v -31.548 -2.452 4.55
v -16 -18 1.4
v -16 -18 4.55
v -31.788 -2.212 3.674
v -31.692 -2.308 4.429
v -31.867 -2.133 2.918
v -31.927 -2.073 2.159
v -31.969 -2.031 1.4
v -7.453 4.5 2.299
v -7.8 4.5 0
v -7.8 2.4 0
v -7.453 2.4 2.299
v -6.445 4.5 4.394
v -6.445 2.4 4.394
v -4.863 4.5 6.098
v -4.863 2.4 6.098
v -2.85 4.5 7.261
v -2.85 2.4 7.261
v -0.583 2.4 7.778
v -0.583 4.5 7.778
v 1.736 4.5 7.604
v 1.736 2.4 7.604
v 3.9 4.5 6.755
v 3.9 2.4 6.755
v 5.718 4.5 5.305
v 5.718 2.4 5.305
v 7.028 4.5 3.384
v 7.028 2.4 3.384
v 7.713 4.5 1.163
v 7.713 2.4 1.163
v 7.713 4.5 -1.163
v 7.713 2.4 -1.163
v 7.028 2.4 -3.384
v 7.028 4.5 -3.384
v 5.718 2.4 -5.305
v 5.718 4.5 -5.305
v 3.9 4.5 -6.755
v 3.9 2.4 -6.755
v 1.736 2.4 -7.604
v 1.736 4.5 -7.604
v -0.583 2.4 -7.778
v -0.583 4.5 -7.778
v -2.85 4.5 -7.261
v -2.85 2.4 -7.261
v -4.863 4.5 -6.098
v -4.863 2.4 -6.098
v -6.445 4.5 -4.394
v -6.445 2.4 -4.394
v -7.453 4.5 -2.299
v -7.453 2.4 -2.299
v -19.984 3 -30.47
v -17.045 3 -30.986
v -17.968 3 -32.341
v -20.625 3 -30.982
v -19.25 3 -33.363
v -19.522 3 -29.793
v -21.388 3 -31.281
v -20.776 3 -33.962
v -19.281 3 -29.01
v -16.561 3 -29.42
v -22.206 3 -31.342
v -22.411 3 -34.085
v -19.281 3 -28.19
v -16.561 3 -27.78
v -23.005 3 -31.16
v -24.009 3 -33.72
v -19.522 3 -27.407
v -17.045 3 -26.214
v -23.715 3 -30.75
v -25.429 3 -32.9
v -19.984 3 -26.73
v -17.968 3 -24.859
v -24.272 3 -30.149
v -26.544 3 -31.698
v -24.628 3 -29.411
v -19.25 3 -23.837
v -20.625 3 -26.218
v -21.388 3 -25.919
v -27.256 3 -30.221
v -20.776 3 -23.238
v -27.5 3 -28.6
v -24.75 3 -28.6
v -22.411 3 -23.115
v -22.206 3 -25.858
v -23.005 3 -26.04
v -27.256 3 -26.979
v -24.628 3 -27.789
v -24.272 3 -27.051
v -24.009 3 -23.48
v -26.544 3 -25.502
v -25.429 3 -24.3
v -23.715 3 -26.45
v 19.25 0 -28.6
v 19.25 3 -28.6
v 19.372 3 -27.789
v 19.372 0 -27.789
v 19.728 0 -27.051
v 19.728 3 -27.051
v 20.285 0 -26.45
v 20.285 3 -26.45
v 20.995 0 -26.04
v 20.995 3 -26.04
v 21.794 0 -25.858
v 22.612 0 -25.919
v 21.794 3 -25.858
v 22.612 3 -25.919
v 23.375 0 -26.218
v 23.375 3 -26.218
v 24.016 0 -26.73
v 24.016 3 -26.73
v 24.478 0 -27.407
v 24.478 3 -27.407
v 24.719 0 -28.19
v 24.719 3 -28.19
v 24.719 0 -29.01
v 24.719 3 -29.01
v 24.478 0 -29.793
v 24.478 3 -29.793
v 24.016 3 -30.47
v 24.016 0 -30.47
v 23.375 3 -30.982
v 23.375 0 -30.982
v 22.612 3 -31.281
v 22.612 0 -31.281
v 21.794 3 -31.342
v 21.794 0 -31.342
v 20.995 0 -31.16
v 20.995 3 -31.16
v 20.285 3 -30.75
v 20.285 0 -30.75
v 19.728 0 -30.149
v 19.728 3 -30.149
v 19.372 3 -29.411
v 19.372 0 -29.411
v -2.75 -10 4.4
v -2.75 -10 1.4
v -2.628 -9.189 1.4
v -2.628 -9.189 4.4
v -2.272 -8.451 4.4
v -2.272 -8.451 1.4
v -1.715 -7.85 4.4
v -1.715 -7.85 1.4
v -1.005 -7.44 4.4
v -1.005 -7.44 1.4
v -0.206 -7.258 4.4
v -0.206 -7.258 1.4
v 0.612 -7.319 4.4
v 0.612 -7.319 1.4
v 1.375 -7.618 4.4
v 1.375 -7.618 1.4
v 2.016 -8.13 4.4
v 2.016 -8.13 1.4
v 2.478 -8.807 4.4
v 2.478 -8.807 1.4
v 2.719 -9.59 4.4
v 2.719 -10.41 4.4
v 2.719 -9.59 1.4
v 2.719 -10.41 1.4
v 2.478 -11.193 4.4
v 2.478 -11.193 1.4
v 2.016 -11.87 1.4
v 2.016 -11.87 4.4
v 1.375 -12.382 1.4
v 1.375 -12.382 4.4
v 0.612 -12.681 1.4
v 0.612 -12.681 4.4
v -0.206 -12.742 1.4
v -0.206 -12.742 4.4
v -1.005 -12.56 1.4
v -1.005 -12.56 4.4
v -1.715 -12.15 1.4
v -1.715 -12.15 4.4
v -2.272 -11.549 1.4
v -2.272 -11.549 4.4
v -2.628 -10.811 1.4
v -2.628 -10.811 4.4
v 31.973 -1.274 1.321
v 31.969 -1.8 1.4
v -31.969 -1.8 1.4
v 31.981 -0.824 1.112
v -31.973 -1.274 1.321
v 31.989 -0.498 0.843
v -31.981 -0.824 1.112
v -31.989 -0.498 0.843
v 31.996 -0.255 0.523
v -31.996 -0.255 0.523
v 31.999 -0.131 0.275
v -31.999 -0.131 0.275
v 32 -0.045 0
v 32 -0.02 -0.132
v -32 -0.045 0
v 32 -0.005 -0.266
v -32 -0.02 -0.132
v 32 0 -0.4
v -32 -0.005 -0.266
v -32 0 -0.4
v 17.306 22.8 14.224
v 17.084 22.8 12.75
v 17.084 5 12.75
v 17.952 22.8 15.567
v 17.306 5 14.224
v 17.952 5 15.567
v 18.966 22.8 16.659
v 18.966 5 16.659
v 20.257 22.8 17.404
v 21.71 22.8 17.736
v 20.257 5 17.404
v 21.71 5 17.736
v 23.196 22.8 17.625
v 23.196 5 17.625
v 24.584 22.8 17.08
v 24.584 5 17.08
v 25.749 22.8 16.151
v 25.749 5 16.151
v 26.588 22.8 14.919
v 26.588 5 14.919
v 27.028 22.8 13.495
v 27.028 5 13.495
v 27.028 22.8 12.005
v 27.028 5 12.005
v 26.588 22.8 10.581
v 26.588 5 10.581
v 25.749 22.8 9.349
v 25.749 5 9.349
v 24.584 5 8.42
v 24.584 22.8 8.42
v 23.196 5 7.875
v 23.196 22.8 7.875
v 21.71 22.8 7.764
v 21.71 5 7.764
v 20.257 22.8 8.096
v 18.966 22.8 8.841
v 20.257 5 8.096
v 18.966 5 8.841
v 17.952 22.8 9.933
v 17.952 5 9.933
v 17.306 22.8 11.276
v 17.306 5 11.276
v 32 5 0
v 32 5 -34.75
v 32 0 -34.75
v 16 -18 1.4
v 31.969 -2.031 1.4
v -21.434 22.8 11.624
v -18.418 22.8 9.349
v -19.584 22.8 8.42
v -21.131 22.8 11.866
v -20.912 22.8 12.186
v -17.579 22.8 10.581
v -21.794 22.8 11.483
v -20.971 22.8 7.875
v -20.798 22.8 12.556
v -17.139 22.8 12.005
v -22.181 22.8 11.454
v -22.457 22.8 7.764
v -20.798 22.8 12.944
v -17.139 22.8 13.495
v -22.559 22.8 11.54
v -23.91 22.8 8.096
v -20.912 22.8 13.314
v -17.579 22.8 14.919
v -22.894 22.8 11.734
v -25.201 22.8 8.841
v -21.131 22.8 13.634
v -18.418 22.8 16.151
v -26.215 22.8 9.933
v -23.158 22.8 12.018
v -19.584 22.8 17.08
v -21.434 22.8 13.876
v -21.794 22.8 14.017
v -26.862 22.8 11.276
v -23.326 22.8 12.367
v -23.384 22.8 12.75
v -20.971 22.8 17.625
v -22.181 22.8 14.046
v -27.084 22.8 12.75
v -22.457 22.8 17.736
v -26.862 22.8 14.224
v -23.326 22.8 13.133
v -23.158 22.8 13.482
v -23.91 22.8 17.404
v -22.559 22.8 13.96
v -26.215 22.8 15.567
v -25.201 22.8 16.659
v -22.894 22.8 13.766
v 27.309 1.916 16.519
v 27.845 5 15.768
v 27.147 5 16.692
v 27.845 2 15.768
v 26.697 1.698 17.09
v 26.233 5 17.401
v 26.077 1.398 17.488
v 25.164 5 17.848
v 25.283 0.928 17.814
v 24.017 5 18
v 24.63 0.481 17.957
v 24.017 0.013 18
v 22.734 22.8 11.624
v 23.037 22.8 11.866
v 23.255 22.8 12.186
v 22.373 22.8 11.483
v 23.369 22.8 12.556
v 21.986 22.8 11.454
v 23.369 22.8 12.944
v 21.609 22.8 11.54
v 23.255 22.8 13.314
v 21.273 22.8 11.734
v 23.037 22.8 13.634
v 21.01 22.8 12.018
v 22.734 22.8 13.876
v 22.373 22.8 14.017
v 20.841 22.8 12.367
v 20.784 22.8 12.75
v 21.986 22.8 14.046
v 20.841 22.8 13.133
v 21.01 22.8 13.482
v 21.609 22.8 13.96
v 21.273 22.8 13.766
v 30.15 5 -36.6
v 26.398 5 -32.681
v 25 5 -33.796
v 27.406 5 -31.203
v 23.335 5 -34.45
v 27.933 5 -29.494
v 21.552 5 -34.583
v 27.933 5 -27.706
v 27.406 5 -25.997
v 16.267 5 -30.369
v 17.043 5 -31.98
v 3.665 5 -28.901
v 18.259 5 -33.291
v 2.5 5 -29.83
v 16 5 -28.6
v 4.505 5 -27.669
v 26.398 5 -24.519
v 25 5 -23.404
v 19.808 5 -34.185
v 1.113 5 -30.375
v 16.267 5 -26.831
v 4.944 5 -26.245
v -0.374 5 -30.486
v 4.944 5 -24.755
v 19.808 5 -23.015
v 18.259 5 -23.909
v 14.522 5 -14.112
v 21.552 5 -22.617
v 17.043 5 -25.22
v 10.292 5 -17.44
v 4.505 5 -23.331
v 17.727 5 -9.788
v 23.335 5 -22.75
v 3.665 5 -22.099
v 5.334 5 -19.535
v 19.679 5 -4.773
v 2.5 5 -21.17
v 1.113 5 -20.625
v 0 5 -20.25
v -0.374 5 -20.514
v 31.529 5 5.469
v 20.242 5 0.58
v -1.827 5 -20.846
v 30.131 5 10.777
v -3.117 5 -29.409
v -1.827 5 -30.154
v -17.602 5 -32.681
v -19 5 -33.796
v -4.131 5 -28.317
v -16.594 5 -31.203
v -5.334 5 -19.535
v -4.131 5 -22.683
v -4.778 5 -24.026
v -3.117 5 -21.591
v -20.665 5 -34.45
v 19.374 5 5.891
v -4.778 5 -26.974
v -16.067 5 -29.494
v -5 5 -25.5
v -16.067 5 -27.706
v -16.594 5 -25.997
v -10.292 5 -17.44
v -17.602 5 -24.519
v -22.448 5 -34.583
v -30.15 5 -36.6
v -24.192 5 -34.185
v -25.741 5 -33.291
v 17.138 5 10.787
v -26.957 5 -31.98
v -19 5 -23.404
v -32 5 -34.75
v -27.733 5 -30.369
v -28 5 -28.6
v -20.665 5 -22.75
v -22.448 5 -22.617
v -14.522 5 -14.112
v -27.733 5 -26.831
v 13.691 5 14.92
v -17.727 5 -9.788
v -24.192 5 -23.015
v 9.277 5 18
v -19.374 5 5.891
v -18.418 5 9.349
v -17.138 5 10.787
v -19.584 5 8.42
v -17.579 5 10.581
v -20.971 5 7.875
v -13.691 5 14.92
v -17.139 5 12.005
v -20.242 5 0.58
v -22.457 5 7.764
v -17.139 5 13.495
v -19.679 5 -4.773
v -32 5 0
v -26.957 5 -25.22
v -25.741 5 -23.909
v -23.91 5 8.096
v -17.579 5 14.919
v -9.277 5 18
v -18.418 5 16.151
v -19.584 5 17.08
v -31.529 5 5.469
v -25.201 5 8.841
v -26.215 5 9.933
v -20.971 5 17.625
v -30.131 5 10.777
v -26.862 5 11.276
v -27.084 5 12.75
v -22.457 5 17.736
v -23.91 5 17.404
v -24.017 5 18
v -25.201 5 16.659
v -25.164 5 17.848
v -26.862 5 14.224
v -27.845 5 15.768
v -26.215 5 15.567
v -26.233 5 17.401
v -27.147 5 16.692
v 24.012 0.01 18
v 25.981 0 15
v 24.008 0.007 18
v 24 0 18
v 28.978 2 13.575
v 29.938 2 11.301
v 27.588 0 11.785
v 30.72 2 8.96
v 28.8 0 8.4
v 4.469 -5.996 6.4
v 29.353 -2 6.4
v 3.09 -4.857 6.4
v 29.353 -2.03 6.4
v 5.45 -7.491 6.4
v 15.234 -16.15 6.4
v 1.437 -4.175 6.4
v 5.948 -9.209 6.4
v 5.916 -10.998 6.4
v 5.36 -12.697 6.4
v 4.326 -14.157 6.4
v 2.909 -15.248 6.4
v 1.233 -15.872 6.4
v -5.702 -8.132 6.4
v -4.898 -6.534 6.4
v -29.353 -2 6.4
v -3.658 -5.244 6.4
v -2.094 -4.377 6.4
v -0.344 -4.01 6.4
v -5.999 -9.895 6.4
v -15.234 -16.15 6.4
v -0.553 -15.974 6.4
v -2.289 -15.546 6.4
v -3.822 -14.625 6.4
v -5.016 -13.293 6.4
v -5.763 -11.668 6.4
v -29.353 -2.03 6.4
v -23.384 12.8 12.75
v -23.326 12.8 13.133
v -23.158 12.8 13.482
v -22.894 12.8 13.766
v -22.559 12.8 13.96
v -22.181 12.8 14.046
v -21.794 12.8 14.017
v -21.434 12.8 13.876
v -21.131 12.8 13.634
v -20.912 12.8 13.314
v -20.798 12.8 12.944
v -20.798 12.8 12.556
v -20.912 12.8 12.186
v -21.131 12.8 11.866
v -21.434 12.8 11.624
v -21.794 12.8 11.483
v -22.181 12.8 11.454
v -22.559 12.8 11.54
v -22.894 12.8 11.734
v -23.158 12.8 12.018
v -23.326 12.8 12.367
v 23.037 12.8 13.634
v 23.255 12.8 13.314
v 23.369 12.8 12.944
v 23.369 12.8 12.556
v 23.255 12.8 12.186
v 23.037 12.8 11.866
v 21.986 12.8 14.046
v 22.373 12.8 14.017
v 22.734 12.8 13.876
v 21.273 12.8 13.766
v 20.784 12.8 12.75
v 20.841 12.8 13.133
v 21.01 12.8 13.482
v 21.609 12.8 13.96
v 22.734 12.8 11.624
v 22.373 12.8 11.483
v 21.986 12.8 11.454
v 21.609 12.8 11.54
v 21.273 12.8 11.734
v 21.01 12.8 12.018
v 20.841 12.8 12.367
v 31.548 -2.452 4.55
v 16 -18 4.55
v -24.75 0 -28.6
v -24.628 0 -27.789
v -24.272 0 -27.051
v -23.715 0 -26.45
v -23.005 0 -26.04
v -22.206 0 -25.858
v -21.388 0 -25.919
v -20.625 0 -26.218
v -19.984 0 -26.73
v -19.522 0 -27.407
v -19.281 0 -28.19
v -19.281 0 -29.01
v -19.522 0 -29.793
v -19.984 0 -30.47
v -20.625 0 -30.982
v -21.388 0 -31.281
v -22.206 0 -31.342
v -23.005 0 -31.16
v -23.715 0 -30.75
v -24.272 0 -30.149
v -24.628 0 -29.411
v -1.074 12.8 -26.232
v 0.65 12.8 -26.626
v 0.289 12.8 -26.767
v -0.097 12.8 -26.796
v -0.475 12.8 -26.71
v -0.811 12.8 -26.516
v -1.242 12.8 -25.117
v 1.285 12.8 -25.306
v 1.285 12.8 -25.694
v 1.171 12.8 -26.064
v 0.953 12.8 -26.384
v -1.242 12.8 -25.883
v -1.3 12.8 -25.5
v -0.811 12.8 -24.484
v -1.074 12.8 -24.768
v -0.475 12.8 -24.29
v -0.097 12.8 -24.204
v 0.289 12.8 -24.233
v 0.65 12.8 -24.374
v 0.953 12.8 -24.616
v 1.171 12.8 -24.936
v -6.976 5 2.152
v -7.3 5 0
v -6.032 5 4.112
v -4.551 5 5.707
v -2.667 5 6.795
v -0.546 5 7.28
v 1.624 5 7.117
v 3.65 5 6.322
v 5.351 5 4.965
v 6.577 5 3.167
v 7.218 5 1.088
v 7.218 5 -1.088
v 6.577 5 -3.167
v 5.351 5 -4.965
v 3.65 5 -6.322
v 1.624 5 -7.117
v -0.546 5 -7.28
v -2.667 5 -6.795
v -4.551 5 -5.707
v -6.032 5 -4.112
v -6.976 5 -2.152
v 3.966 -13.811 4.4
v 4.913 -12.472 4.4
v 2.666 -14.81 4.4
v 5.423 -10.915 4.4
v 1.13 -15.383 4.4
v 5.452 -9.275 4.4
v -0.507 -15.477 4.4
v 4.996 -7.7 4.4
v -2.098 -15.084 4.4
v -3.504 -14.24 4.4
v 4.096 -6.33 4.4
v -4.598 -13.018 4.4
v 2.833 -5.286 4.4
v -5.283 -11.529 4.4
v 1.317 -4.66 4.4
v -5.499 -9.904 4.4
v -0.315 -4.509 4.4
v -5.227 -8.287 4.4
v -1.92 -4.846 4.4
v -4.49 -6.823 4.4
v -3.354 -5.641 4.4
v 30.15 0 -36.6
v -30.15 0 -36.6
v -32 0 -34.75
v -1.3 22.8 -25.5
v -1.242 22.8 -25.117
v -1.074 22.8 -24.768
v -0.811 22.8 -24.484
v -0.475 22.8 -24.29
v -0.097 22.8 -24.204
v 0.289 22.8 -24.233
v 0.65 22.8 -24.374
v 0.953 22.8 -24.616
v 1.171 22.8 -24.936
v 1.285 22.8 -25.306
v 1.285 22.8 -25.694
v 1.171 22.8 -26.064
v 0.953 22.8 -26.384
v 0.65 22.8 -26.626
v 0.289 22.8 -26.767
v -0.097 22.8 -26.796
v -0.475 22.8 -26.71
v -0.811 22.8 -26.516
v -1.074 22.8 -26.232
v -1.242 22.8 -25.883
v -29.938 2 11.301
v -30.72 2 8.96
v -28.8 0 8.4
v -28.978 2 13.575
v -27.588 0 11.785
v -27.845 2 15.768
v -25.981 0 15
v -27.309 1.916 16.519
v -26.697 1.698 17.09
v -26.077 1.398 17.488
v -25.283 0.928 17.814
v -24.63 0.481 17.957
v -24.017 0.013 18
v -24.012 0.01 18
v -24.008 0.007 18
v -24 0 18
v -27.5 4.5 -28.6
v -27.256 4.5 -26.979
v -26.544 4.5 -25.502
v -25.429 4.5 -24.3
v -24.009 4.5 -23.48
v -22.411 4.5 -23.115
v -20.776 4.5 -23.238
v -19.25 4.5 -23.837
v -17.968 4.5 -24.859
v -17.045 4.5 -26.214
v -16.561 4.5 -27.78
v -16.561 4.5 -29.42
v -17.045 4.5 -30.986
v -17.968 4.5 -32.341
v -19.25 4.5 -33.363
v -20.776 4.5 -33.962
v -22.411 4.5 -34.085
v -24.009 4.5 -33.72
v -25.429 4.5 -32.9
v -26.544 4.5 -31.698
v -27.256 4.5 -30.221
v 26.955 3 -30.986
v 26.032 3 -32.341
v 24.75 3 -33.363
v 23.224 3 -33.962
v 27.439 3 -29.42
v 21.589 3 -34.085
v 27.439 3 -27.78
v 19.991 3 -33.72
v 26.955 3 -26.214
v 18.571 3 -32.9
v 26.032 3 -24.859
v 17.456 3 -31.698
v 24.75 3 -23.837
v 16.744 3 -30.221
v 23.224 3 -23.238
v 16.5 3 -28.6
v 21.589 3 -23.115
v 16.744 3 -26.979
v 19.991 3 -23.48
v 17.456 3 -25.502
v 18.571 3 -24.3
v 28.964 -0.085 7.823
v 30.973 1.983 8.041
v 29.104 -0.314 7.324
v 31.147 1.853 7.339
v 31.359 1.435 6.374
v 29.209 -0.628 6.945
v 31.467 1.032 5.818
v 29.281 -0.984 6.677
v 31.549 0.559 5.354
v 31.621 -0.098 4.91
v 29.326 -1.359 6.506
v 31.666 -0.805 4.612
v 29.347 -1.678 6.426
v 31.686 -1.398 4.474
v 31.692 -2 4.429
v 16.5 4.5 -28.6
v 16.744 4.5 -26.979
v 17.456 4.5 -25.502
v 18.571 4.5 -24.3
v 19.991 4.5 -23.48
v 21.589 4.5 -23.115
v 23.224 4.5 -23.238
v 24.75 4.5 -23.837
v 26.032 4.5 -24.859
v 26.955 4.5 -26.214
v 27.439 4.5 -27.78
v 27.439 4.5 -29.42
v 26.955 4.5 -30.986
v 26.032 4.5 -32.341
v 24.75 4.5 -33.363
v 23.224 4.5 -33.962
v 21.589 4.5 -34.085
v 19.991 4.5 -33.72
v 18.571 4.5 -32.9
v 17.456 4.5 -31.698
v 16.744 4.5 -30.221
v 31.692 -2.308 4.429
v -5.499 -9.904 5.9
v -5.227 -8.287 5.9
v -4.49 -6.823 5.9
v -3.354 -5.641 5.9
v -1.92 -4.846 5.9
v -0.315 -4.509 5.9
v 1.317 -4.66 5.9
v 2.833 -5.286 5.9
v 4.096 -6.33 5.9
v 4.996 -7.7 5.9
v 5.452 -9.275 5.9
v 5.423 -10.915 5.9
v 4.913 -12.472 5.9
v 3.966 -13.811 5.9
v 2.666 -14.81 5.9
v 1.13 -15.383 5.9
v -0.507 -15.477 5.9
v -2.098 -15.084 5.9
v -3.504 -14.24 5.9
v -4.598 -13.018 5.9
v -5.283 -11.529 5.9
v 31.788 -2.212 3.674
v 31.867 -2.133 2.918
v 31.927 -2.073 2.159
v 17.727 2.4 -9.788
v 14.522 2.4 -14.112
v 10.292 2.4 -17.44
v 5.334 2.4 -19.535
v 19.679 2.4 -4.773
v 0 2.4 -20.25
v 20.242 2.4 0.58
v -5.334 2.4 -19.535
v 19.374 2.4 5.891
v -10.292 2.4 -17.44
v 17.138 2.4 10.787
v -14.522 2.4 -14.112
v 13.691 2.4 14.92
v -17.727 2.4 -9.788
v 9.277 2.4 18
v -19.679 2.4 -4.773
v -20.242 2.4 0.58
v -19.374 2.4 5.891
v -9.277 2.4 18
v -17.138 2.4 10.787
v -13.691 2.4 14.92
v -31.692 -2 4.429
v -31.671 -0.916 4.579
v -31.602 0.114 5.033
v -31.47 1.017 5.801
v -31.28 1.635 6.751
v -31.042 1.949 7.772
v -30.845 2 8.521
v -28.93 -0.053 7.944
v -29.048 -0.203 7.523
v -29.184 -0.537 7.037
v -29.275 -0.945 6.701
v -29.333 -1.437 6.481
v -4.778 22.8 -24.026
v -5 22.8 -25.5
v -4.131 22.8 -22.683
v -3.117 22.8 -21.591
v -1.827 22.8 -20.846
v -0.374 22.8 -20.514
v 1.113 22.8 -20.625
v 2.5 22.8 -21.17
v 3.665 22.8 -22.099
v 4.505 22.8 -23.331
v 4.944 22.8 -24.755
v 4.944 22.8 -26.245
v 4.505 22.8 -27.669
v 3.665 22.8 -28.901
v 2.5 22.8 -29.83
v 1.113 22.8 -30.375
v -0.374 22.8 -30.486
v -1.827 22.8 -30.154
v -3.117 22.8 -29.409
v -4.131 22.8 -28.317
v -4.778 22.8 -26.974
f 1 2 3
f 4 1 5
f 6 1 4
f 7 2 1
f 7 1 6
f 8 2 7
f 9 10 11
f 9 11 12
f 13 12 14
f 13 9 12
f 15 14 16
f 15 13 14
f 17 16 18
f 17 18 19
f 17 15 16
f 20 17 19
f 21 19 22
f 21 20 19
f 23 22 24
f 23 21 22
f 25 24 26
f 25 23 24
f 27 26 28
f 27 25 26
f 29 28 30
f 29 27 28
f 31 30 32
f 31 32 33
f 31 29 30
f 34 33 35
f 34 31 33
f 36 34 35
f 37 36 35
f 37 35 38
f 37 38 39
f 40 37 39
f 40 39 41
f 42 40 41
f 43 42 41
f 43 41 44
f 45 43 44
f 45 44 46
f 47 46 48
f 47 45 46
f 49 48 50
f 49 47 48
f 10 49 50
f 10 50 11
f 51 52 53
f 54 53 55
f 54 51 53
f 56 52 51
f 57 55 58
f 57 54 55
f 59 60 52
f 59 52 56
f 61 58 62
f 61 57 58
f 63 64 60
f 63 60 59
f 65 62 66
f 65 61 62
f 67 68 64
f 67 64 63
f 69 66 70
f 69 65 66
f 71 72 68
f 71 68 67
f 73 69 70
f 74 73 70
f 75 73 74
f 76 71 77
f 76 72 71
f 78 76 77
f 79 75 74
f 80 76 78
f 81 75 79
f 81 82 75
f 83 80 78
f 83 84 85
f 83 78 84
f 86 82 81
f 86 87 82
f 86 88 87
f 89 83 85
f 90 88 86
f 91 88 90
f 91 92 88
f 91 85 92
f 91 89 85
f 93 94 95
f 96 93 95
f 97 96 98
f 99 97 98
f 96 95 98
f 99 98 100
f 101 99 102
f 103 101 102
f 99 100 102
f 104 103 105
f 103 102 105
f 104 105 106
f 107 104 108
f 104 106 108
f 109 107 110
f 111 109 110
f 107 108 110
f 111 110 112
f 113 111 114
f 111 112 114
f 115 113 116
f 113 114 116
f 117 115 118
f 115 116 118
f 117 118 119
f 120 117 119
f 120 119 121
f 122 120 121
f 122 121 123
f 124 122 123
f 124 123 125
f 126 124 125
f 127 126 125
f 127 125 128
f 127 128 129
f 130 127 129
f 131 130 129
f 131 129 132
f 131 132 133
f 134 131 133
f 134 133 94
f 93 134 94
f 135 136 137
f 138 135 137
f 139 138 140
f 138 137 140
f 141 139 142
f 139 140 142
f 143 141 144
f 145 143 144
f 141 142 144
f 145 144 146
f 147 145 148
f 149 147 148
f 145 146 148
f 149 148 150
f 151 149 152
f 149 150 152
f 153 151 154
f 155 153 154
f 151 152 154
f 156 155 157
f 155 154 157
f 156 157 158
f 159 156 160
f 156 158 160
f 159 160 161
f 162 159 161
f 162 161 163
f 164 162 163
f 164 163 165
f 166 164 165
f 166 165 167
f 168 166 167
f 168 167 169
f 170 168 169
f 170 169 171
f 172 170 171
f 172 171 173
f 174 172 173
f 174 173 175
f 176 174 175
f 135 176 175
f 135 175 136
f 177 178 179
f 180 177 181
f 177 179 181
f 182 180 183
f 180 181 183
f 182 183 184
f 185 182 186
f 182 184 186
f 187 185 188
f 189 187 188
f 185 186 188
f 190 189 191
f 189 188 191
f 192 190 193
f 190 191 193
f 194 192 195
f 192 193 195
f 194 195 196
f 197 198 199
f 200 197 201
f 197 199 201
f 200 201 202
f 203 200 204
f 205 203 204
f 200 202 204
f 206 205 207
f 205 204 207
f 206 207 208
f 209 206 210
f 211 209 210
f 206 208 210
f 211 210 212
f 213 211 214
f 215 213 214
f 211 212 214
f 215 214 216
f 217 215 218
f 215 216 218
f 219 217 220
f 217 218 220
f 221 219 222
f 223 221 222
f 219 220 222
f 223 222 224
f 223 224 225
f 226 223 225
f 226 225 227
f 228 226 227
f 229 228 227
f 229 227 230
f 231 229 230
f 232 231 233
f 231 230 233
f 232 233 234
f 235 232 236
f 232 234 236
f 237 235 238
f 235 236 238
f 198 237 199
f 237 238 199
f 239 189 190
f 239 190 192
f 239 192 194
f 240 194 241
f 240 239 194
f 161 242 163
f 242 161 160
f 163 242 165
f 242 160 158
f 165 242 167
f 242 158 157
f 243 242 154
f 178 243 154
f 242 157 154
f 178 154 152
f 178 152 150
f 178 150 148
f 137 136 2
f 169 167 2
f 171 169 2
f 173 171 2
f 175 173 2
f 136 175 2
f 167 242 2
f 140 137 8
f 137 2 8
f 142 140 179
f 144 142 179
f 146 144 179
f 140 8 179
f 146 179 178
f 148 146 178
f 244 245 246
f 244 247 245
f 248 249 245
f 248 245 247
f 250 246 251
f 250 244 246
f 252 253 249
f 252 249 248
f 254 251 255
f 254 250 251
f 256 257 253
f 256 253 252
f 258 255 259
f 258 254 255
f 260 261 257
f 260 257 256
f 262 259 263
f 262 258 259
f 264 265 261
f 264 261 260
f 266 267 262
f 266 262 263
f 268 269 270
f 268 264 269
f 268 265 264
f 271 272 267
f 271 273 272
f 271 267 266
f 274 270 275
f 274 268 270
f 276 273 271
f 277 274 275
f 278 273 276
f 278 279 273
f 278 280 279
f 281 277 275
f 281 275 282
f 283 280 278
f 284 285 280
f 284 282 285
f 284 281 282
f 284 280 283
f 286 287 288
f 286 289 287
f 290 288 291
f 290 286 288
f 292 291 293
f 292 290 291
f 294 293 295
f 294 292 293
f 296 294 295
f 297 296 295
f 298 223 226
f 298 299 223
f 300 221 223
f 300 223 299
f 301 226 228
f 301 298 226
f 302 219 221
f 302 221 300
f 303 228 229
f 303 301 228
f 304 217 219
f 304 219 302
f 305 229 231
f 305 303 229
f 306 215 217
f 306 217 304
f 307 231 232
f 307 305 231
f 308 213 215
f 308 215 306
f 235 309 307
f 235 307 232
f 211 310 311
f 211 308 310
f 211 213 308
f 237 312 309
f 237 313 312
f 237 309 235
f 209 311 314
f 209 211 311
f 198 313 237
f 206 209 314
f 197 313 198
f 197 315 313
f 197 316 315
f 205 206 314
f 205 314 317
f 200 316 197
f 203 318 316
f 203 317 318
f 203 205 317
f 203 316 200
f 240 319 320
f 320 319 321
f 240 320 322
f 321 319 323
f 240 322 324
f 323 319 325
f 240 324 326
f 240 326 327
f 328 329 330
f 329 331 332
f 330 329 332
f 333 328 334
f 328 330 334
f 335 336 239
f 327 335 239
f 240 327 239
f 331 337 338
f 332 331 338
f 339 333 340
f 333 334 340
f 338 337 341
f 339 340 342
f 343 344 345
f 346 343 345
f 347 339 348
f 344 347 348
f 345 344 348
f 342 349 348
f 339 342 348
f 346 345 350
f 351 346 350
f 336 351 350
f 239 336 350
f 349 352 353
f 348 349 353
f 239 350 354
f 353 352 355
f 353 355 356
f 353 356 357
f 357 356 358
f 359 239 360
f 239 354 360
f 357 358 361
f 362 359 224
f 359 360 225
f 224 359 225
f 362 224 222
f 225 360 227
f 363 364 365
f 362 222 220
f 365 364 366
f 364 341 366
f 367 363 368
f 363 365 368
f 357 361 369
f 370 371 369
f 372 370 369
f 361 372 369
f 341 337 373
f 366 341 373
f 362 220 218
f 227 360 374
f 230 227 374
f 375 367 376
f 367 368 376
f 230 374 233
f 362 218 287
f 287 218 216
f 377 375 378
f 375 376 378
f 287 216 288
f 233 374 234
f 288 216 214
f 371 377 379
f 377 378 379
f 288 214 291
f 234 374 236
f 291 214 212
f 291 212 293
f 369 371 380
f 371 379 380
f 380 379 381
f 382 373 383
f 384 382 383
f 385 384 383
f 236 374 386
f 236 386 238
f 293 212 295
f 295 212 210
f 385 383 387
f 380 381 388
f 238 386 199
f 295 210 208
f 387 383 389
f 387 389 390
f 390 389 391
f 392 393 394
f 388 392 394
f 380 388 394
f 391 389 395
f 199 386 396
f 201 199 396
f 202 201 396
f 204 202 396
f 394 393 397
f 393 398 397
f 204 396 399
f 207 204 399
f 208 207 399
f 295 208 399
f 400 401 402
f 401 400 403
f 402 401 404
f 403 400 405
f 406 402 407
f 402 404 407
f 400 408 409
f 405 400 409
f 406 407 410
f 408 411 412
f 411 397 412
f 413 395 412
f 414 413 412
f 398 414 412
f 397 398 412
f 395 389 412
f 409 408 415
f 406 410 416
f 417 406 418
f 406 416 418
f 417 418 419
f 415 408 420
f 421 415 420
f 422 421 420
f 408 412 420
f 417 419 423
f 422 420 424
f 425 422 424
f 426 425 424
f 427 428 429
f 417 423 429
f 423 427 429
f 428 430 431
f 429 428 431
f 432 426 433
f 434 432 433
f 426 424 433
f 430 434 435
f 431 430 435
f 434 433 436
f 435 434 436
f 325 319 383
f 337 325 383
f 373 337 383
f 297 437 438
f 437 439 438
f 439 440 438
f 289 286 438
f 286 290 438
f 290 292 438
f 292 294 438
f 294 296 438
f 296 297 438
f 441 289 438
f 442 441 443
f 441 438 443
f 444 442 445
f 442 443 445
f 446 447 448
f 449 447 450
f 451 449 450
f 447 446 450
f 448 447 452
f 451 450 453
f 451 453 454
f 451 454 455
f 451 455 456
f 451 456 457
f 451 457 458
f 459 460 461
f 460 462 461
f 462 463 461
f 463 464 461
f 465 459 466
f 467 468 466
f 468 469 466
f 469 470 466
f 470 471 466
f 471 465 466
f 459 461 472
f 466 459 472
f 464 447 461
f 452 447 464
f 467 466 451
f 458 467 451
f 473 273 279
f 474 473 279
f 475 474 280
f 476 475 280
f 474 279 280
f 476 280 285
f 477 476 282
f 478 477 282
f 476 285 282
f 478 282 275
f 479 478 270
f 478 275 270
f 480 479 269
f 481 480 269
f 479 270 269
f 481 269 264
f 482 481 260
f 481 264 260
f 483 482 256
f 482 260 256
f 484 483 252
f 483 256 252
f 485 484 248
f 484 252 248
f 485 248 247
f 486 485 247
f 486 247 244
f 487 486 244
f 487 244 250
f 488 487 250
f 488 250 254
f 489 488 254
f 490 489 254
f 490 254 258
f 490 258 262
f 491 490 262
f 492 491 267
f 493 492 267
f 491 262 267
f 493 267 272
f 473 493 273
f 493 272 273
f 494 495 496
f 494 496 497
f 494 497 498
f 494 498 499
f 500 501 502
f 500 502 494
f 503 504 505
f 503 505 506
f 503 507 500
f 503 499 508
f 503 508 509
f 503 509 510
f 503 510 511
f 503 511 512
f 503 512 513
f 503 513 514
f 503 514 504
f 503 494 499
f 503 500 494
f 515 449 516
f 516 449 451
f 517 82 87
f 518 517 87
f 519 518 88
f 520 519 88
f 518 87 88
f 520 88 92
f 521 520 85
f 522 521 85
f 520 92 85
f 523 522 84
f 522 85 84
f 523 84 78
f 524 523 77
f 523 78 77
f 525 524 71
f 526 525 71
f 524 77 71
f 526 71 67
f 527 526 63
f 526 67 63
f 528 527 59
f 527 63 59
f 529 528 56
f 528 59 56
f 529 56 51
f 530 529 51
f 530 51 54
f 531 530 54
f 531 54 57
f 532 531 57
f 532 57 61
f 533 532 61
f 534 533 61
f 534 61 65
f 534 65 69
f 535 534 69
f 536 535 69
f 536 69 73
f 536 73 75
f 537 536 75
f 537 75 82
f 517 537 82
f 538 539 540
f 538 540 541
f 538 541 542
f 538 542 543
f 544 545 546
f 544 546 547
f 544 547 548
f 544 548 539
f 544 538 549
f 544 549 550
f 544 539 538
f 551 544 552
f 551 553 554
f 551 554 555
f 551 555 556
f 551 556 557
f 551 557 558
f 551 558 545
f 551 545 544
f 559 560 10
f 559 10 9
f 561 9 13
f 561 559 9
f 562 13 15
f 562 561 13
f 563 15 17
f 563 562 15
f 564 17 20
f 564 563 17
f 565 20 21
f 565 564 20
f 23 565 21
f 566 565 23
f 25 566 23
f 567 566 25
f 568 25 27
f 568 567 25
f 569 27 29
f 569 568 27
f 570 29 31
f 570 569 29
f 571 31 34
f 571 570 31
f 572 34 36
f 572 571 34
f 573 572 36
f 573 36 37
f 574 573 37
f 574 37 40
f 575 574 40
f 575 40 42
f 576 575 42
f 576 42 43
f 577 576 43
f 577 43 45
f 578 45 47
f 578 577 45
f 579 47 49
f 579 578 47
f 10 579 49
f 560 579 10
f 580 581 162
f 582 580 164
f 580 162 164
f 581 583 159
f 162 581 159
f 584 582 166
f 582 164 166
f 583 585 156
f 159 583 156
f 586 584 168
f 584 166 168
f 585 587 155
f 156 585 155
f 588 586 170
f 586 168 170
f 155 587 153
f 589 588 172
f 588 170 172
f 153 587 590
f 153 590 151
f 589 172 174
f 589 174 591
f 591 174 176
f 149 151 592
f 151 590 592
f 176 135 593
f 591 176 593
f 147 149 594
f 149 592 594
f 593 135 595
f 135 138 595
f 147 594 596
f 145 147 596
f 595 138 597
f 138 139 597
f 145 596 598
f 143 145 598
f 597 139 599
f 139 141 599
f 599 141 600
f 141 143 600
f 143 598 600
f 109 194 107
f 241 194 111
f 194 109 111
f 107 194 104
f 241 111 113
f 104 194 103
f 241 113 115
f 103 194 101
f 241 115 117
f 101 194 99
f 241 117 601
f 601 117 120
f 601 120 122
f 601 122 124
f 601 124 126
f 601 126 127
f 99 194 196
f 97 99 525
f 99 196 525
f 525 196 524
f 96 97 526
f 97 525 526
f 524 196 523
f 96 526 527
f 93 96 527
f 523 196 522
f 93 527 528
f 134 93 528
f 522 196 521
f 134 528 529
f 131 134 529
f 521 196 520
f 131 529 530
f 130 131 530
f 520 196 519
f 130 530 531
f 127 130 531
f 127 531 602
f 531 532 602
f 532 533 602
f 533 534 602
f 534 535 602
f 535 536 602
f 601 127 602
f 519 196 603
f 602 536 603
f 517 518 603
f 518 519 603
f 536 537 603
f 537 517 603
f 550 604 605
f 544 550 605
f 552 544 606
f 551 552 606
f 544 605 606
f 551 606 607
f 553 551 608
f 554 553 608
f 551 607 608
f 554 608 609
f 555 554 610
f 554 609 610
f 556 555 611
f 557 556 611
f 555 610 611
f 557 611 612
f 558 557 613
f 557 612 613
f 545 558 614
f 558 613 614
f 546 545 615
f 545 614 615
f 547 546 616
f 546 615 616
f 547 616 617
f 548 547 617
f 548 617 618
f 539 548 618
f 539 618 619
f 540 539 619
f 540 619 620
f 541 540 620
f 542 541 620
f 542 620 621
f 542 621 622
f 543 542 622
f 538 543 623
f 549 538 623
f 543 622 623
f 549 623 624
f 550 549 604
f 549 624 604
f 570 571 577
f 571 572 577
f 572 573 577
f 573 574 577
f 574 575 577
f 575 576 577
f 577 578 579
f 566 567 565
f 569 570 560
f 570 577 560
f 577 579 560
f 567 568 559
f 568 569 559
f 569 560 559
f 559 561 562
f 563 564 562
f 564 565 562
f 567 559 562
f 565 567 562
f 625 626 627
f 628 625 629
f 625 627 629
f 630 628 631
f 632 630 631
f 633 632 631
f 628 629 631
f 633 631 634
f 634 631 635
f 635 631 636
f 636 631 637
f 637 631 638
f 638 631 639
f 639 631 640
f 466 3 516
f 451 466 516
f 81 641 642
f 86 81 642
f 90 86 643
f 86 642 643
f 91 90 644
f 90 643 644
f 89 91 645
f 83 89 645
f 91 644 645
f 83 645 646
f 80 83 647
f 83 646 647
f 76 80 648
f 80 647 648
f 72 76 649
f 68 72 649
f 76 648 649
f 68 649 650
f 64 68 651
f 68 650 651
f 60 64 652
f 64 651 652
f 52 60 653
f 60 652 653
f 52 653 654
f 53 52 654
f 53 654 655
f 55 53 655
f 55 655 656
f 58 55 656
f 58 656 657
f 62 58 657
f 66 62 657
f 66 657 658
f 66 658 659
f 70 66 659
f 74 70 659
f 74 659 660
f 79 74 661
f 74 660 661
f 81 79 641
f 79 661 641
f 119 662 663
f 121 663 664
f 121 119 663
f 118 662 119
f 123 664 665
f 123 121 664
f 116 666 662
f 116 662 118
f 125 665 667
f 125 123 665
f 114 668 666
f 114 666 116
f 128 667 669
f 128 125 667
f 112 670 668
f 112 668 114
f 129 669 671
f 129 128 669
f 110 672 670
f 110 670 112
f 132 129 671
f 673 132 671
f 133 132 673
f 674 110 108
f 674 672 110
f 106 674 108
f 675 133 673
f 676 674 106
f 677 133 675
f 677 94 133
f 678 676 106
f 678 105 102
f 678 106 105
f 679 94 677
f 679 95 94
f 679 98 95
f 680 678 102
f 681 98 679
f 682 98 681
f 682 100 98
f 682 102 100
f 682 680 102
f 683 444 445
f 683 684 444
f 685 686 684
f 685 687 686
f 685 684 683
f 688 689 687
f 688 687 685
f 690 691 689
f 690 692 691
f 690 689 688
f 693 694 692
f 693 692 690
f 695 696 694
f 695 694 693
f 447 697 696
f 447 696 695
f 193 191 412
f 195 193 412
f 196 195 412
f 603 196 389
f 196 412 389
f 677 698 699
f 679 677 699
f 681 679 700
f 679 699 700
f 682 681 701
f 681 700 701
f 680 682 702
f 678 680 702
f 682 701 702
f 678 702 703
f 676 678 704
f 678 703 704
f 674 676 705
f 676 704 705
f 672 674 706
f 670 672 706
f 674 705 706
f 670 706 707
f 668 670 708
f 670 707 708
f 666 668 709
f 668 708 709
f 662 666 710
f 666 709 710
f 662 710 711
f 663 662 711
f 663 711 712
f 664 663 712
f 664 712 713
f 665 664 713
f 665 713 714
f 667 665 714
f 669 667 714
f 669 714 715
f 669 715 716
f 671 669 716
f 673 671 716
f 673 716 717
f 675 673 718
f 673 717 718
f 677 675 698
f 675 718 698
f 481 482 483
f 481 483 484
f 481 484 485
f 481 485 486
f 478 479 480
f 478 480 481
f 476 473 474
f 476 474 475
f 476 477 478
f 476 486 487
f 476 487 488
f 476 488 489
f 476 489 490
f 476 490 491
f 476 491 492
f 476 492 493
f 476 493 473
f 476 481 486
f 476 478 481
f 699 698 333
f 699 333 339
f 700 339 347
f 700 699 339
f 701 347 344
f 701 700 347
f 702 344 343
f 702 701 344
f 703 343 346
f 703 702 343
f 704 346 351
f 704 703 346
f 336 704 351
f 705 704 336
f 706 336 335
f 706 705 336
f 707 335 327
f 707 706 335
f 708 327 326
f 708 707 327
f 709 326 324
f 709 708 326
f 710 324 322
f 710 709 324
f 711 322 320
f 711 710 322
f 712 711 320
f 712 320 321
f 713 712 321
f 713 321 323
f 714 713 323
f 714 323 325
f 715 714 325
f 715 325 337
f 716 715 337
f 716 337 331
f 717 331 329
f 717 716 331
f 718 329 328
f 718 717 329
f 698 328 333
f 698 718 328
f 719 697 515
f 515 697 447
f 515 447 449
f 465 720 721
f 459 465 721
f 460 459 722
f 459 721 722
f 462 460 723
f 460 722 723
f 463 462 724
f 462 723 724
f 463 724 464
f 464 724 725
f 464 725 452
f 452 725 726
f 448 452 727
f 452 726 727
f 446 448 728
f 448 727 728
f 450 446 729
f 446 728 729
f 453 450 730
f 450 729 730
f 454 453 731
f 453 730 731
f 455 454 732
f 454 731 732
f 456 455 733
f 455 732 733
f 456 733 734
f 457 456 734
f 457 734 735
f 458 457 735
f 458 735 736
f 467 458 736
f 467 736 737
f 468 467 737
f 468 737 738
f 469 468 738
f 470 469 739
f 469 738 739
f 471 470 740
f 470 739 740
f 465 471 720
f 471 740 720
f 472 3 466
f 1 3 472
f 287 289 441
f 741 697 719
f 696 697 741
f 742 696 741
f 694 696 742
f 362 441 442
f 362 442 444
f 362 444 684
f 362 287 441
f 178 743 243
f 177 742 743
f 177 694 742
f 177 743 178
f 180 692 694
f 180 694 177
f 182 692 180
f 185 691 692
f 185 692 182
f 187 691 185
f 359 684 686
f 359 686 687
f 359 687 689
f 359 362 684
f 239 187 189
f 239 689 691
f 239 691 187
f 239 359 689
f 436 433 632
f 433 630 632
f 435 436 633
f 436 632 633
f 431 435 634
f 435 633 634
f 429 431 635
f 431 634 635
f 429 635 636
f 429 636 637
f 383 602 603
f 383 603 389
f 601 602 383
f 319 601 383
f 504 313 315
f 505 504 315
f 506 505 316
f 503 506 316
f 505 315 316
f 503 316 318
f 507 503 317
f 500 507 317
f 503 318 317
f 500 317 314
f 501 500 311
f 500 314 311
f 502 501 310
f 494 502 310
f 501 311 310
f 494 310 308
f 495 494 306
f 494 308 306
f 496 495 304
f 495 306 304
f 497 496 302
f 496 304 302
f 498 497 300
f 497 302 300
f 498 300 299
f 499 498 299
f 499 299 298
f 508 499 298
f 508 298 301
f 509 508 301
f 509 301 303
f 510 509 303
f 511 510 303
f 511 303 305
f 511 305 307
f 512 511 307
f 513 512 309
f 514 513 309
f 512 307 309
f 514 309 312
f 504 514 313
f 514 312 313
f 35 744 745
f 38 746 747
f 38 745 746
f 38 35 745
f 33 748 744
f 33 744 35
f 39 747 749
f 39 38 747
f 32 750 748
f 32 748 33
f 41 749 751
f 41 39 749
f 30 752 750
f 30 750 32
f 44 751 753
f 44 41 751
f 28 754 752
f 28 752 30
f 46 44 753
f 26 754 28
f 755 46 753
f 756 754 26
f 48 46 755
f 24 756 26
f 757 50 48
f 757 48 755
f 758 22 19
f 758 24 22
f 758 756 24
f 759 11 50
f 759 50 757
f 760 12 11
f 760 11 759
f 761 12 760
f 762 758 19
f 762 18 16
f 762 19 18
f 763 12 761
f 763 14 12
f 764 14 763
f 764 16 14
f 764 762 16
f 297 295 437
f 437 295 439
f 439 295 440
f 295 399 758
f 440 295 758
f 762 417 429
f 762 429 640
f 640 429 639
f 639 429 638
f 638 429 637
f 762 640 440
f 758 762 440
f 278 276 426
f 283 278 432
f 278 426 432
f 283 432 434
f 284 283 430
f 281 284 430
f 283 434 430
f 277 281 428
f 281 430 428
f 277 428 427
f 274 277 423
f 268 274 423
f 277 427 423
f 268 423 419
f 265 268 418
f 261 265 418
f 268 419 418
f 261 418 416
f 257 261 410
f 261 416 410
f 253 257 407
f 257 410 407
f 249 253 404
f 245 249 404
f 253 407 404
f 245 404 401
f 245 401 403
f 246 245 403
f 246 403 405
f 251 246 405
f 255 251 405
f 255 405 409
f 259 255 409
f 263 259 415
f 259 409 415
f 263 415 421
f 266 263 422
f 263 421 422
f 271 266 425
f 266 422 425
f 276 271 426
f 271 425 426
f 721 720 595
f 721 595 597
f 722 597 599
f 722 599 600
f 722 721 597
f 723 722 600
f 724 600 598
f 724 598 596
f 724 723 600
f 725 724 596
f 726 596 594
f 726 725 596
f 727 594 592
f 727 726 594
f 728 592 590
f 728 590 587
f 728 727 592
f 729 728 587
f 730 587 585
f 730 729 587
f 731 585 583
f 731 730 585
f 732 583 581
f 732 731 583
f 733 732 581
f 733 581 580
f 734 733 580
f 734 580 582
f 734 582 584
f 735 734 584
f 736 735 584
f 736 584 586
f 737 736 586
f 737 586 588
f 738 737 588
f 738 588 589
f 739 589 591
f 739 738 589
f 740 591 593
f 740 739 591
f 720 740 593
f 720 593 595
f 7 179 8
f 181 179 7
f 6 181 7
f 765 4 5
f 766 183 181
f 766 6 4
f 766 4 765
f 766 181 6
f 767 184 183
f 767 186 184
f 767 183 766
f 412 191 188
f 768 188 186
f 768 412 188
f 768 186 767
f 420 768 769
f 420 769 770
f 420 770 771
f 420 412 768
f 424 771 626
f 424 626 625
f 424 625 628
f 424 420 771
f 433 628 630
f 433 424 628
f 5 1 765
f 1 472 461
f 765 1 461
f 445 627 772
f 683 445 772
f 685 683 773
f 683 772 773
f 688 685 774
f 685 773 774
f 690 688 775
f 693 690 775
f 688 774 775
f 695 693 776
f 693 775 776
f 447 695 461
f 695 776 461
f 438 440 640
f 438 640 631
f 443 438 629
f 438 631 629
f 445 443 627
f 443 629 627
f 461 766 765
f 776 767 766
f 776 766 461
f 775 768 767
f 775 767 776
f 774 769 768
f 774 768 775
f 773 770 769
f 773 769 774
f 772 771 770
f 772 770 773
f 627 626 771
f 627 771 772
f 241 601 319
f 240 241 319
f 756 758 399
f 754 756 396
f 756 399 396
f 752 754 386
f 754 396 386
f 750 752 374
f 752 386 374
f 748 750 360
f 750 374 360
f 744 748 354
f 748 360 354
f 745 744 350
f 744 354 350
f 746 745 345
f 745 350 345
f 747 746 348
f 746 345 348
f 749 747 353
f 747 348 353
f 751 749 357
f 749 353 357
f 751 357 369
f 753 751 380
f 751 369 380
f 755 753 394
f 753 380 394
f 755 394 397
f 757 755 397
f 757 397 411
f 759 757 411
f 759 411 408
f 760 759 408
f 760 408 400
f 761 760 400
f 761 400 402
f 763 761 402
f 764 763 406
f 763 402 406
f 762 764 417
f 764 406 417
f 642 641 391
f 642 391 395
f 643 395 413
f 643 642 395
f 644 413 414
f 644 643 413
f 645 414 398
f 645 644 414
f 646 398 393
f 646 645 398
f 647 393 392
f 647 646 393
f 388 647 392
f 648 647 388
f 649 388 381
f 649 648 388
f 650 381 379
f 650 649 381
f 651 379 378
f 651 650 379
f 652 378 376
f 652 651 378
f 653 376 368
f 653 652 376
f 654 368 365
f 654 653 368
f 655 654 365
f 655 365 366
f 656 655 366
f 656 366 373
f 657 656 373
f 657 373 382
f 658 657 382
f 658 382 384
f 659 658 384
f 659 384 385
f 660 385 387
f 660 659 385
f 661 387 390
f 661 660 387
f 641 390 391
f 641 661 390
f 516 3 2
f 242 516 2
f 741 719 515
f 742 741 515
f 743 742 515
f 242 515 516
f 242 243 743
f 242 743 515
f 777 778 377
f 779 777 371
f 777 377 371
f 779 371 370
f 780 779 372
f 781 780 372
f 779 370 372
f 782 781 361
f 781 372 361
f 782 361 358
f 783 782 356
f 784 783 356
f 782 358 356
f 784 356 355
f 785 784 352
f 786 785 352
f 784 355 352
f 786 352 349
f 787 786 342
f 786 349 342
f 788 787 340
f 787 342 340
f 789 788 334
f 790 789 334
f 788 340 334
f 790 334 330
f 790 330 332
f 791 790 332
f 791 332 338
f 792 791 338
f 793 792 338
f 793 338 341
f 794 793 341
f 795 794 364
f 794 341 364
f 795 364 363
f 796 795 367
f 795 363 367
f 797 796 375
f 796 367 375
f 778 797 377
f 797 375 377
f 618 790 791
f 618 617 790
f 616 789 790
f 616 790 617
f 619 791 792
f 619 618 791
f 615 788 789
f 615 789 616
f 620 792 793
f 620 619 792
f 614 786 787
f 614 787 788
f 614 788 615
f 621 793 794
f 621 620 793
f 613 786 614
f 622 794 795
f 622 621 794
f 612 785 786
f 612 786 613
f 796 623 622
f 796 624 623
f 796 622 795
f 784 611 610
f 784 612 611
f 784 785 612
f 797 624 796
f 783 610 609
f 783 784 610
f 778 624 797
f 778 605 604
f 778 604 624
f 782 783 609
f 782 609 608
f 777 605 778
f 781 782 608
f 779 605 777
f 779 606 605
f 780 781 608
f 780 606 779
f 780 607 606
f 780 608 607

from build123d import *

# Parameters (mm, degrees)
PAD001_DEPTH                  = 32
SKETCH010_R                   = 20.25
SKETCH010_R_2                 = 7.8
POCKET_DEPTH                  = 2.6
SKETCH011_R                   = 2.75
POCKET001_DEPTH               = 23.001
SKETCH014_R                   = 5.5
POCKET004_DEPTH               = 2
SKETCH008_R                   = 5
PAD002_DEPTH                  = 17.8
SKETCH012_R                   = 1.3
POCKET002_DEPTH               = 10
SKETCH013_R                   = 2.75
POCKET003_DEPTH               = 18.001
SKETCH015_R                   = 5.5
POCKET005_DEPTH               = 2
CHAMFER_SIZE                  = 2
CHAMFER001_SIZE               = 1.85
CHAMFER002_SIZE               = 0.5
FILLET_R                      = 4.4
BODY001082169_ROLL_ANGLE      = 90
BODY001082169_PLACEMENT_ANGLE = 180


with BuildPart() as part:
    # Sketch009 → Pad001 (new body, symmetric)
    with BuildSketch(Plane.YZ):
        with BuildLine():
            Line((-36.6, 0), (-36.6, 5))
            Line((-36.6, 5), (18, 5))
            Line((18, 5), (18, 0))
            Line((18, 0), (8.4, 0))
            ThreePointArc((8.4, 0), (6.985786, -0.585786), (6.4, -2))
            Line((6.4, -2), (6.4, -18))
            Line((6.4, -18), (1.4, -18))
            Line((1.4, -18), (1.4, -1.8))
            ThreePointArc((1.4, -1.8), (0.872792, -0.527208), (-0.4, 0))
            Line((-0.4, 0), (-36.6, 0))
        make_face()
    extrude(amount=PAD001_DEPTH, both=True)

    # Sketch010 → Pocket (cut)
    with BuildSketch(Plane.XY.offset(5)):
        Circle(SKETCH010_R)
        Circle(SKETCH010_R_2, mode=Mode.SUBTRACT)
    extrude(amount=-POCKET_DEPTH, mode=Mode.SUBTRACT)

    # Sketch011 → Pocket001 (cut, through all)
    with BuildSketch(Plane.XY.offset(5)):
        with Locations((22, -28.6)):
            Circle(SKETCH011_R)
        with Locations((-22, -28.6)):
            Circle(SKETCH011_R)
        with BuildLine():
            ThreePointArc((-26.457513, 18), (-30.583005, 9.416995), (-32, 0))
            Line((-32, 0), (-33, 0))
            Line((-33, 0), (-33, 19))
            Line((-33, 19), (33, 19))
            Line((33, 19), (33, 0))
            Line((33, 0), (32, 0))
            ThreePointArc((32, 0), (30.583005, 9.416995), (26.457513, 18))
            Line((-26.457513, 18), (26.457513, 18))
        make_face()
    extrude(amount=-POCKET001_DEPTH, mode=Mode.SUBTRACT)

    # Sketch014 → Pocket004 (cut)
    with BuildSketch(Plane.XY.offset(5)):
        with Locations((-22, -28.6)):
            Circle(SKETCH014_R)
        with Locations((22, -28.6)):
            Circle(SKETCH014_R)
    extrude(amount=-POCKET004_DEPTH, mode=Mode.SUBTRACT)

    # Sketch008 → Pad002 (join)
    with BuildSketch(Plane.XY.offset(5)):
        with Locations((-22.083648, 12.75)):
            Circle(SKETCH008_R)
        with Locations((22.083648, 12.75)):
            Circle(SKETCH008_R)
        with Locations((0, -25.5)):
            Circle(SKETCH008_R)
    extrude(amount=PAD002_DEPTH)

    # Sketch012 → Pocket002 (cut)
    with BuildSketch(Plane.XY.offset(22.8)):
        with Locations((-22.083648, 12.75)):
            Circle(SKETCH012_R)
        with Locations((22.083648, 12.75)):
            Circle(SKETCH012_R)
        with Locations((0, -25.5)):
            Circle(SKETCH012_R)
    extrude(amount=-POCKET002_DEPTH, mode=Mode.SUBTRACT)

    # Sketch013 → Pocket003 (cut, through all)
    with BuildSketch(Plane.XZ):
        with Locations((0, -10)):
            Circle(SKETCH013_R)
        Polygon((-32, -2), (-16, -18), (16, -18), (32, -2), (33, -2), (33, -20), (-33, -20), (-33, -2), align=None)
    extrude(amount=-POCKET003_DEPTH, mode=Mode.SUBTRACT)

    # Sketch015 → Pocket005 (cut)
    with BuildSketch(Plane(origin=(0, 6.4, 0), x_dir=(0.999848, 0, 0.017452), z_dir=(0, -1, 0))):
        with Locations((-0.174524, -9.998477)):
            Circle(SKETCH015_R)
    extrude(amount=POCKET005_DEPTH, mode=Mode.SUBTRACT)

    # Chamfer
    chamfer_edges = [part.edges().sort_by_distance(p)[0] for p in [
        (29.066737, 13.383751, 0),
        (31.225598, 6.997288, -0.574378),
        (-29.066737, 13.383751, 0),
        (-31.225598, 6.997288, -0.574378),
    ]]
    chamfer(chamfer_edges, length=CHAMFER_SIZE)

    # Chamfer001
    chamfer001_edges = [part.edges().sort_by_distance(p)[0] for p in [
        (22.676734, 6.4, -11.323266),
        (0, 6.4, -18),
        (-22.676734, 6.4, -11.323266),
        (-32, -36.6, 2.5),
        (32, -36.6, 2.5),
    ]]
    chamfer(chamfer001_edges, length=CHAMFER001_SIZE)

    # Chamfer002
    chamfer002_edges = [part.edges().sort_by_distance(p)[0] for p in [
        (-27.5, -28.6, 5),
        (16.5, -28.6, 5),
        (-7.8, 0, 5),
        (-5.499162, 6.4, -10.095988),
    ]]
    chamfer(chamfer002_edges, length=CHAMFER002_SIZE)

    # Fillet
    fillet_edges = [part.edges().sort_by_distance(p)[0] for p in [
        (-26.457513, 18, 3.5),
        (26.457513, 18, 3.5),
    ]]
    fillet(fillet_edges, radius=FILLET_R)


with BuildPart() as part_1:
    # Body001082169 roll: moved
    add(part.part.rotate(Axis((0, 0, 0), (1, 0, 0)), BODY001082169_ROLL_ANGLE))


with BuildPart() as part_2:
    # Body001082169 placement: moved
    add(part_1.part.rotate(Axis((0, 0, 0), (0, 0, 1)), BODY001082169_PLACEMENT_ANGLE))


solid = part_2.part
